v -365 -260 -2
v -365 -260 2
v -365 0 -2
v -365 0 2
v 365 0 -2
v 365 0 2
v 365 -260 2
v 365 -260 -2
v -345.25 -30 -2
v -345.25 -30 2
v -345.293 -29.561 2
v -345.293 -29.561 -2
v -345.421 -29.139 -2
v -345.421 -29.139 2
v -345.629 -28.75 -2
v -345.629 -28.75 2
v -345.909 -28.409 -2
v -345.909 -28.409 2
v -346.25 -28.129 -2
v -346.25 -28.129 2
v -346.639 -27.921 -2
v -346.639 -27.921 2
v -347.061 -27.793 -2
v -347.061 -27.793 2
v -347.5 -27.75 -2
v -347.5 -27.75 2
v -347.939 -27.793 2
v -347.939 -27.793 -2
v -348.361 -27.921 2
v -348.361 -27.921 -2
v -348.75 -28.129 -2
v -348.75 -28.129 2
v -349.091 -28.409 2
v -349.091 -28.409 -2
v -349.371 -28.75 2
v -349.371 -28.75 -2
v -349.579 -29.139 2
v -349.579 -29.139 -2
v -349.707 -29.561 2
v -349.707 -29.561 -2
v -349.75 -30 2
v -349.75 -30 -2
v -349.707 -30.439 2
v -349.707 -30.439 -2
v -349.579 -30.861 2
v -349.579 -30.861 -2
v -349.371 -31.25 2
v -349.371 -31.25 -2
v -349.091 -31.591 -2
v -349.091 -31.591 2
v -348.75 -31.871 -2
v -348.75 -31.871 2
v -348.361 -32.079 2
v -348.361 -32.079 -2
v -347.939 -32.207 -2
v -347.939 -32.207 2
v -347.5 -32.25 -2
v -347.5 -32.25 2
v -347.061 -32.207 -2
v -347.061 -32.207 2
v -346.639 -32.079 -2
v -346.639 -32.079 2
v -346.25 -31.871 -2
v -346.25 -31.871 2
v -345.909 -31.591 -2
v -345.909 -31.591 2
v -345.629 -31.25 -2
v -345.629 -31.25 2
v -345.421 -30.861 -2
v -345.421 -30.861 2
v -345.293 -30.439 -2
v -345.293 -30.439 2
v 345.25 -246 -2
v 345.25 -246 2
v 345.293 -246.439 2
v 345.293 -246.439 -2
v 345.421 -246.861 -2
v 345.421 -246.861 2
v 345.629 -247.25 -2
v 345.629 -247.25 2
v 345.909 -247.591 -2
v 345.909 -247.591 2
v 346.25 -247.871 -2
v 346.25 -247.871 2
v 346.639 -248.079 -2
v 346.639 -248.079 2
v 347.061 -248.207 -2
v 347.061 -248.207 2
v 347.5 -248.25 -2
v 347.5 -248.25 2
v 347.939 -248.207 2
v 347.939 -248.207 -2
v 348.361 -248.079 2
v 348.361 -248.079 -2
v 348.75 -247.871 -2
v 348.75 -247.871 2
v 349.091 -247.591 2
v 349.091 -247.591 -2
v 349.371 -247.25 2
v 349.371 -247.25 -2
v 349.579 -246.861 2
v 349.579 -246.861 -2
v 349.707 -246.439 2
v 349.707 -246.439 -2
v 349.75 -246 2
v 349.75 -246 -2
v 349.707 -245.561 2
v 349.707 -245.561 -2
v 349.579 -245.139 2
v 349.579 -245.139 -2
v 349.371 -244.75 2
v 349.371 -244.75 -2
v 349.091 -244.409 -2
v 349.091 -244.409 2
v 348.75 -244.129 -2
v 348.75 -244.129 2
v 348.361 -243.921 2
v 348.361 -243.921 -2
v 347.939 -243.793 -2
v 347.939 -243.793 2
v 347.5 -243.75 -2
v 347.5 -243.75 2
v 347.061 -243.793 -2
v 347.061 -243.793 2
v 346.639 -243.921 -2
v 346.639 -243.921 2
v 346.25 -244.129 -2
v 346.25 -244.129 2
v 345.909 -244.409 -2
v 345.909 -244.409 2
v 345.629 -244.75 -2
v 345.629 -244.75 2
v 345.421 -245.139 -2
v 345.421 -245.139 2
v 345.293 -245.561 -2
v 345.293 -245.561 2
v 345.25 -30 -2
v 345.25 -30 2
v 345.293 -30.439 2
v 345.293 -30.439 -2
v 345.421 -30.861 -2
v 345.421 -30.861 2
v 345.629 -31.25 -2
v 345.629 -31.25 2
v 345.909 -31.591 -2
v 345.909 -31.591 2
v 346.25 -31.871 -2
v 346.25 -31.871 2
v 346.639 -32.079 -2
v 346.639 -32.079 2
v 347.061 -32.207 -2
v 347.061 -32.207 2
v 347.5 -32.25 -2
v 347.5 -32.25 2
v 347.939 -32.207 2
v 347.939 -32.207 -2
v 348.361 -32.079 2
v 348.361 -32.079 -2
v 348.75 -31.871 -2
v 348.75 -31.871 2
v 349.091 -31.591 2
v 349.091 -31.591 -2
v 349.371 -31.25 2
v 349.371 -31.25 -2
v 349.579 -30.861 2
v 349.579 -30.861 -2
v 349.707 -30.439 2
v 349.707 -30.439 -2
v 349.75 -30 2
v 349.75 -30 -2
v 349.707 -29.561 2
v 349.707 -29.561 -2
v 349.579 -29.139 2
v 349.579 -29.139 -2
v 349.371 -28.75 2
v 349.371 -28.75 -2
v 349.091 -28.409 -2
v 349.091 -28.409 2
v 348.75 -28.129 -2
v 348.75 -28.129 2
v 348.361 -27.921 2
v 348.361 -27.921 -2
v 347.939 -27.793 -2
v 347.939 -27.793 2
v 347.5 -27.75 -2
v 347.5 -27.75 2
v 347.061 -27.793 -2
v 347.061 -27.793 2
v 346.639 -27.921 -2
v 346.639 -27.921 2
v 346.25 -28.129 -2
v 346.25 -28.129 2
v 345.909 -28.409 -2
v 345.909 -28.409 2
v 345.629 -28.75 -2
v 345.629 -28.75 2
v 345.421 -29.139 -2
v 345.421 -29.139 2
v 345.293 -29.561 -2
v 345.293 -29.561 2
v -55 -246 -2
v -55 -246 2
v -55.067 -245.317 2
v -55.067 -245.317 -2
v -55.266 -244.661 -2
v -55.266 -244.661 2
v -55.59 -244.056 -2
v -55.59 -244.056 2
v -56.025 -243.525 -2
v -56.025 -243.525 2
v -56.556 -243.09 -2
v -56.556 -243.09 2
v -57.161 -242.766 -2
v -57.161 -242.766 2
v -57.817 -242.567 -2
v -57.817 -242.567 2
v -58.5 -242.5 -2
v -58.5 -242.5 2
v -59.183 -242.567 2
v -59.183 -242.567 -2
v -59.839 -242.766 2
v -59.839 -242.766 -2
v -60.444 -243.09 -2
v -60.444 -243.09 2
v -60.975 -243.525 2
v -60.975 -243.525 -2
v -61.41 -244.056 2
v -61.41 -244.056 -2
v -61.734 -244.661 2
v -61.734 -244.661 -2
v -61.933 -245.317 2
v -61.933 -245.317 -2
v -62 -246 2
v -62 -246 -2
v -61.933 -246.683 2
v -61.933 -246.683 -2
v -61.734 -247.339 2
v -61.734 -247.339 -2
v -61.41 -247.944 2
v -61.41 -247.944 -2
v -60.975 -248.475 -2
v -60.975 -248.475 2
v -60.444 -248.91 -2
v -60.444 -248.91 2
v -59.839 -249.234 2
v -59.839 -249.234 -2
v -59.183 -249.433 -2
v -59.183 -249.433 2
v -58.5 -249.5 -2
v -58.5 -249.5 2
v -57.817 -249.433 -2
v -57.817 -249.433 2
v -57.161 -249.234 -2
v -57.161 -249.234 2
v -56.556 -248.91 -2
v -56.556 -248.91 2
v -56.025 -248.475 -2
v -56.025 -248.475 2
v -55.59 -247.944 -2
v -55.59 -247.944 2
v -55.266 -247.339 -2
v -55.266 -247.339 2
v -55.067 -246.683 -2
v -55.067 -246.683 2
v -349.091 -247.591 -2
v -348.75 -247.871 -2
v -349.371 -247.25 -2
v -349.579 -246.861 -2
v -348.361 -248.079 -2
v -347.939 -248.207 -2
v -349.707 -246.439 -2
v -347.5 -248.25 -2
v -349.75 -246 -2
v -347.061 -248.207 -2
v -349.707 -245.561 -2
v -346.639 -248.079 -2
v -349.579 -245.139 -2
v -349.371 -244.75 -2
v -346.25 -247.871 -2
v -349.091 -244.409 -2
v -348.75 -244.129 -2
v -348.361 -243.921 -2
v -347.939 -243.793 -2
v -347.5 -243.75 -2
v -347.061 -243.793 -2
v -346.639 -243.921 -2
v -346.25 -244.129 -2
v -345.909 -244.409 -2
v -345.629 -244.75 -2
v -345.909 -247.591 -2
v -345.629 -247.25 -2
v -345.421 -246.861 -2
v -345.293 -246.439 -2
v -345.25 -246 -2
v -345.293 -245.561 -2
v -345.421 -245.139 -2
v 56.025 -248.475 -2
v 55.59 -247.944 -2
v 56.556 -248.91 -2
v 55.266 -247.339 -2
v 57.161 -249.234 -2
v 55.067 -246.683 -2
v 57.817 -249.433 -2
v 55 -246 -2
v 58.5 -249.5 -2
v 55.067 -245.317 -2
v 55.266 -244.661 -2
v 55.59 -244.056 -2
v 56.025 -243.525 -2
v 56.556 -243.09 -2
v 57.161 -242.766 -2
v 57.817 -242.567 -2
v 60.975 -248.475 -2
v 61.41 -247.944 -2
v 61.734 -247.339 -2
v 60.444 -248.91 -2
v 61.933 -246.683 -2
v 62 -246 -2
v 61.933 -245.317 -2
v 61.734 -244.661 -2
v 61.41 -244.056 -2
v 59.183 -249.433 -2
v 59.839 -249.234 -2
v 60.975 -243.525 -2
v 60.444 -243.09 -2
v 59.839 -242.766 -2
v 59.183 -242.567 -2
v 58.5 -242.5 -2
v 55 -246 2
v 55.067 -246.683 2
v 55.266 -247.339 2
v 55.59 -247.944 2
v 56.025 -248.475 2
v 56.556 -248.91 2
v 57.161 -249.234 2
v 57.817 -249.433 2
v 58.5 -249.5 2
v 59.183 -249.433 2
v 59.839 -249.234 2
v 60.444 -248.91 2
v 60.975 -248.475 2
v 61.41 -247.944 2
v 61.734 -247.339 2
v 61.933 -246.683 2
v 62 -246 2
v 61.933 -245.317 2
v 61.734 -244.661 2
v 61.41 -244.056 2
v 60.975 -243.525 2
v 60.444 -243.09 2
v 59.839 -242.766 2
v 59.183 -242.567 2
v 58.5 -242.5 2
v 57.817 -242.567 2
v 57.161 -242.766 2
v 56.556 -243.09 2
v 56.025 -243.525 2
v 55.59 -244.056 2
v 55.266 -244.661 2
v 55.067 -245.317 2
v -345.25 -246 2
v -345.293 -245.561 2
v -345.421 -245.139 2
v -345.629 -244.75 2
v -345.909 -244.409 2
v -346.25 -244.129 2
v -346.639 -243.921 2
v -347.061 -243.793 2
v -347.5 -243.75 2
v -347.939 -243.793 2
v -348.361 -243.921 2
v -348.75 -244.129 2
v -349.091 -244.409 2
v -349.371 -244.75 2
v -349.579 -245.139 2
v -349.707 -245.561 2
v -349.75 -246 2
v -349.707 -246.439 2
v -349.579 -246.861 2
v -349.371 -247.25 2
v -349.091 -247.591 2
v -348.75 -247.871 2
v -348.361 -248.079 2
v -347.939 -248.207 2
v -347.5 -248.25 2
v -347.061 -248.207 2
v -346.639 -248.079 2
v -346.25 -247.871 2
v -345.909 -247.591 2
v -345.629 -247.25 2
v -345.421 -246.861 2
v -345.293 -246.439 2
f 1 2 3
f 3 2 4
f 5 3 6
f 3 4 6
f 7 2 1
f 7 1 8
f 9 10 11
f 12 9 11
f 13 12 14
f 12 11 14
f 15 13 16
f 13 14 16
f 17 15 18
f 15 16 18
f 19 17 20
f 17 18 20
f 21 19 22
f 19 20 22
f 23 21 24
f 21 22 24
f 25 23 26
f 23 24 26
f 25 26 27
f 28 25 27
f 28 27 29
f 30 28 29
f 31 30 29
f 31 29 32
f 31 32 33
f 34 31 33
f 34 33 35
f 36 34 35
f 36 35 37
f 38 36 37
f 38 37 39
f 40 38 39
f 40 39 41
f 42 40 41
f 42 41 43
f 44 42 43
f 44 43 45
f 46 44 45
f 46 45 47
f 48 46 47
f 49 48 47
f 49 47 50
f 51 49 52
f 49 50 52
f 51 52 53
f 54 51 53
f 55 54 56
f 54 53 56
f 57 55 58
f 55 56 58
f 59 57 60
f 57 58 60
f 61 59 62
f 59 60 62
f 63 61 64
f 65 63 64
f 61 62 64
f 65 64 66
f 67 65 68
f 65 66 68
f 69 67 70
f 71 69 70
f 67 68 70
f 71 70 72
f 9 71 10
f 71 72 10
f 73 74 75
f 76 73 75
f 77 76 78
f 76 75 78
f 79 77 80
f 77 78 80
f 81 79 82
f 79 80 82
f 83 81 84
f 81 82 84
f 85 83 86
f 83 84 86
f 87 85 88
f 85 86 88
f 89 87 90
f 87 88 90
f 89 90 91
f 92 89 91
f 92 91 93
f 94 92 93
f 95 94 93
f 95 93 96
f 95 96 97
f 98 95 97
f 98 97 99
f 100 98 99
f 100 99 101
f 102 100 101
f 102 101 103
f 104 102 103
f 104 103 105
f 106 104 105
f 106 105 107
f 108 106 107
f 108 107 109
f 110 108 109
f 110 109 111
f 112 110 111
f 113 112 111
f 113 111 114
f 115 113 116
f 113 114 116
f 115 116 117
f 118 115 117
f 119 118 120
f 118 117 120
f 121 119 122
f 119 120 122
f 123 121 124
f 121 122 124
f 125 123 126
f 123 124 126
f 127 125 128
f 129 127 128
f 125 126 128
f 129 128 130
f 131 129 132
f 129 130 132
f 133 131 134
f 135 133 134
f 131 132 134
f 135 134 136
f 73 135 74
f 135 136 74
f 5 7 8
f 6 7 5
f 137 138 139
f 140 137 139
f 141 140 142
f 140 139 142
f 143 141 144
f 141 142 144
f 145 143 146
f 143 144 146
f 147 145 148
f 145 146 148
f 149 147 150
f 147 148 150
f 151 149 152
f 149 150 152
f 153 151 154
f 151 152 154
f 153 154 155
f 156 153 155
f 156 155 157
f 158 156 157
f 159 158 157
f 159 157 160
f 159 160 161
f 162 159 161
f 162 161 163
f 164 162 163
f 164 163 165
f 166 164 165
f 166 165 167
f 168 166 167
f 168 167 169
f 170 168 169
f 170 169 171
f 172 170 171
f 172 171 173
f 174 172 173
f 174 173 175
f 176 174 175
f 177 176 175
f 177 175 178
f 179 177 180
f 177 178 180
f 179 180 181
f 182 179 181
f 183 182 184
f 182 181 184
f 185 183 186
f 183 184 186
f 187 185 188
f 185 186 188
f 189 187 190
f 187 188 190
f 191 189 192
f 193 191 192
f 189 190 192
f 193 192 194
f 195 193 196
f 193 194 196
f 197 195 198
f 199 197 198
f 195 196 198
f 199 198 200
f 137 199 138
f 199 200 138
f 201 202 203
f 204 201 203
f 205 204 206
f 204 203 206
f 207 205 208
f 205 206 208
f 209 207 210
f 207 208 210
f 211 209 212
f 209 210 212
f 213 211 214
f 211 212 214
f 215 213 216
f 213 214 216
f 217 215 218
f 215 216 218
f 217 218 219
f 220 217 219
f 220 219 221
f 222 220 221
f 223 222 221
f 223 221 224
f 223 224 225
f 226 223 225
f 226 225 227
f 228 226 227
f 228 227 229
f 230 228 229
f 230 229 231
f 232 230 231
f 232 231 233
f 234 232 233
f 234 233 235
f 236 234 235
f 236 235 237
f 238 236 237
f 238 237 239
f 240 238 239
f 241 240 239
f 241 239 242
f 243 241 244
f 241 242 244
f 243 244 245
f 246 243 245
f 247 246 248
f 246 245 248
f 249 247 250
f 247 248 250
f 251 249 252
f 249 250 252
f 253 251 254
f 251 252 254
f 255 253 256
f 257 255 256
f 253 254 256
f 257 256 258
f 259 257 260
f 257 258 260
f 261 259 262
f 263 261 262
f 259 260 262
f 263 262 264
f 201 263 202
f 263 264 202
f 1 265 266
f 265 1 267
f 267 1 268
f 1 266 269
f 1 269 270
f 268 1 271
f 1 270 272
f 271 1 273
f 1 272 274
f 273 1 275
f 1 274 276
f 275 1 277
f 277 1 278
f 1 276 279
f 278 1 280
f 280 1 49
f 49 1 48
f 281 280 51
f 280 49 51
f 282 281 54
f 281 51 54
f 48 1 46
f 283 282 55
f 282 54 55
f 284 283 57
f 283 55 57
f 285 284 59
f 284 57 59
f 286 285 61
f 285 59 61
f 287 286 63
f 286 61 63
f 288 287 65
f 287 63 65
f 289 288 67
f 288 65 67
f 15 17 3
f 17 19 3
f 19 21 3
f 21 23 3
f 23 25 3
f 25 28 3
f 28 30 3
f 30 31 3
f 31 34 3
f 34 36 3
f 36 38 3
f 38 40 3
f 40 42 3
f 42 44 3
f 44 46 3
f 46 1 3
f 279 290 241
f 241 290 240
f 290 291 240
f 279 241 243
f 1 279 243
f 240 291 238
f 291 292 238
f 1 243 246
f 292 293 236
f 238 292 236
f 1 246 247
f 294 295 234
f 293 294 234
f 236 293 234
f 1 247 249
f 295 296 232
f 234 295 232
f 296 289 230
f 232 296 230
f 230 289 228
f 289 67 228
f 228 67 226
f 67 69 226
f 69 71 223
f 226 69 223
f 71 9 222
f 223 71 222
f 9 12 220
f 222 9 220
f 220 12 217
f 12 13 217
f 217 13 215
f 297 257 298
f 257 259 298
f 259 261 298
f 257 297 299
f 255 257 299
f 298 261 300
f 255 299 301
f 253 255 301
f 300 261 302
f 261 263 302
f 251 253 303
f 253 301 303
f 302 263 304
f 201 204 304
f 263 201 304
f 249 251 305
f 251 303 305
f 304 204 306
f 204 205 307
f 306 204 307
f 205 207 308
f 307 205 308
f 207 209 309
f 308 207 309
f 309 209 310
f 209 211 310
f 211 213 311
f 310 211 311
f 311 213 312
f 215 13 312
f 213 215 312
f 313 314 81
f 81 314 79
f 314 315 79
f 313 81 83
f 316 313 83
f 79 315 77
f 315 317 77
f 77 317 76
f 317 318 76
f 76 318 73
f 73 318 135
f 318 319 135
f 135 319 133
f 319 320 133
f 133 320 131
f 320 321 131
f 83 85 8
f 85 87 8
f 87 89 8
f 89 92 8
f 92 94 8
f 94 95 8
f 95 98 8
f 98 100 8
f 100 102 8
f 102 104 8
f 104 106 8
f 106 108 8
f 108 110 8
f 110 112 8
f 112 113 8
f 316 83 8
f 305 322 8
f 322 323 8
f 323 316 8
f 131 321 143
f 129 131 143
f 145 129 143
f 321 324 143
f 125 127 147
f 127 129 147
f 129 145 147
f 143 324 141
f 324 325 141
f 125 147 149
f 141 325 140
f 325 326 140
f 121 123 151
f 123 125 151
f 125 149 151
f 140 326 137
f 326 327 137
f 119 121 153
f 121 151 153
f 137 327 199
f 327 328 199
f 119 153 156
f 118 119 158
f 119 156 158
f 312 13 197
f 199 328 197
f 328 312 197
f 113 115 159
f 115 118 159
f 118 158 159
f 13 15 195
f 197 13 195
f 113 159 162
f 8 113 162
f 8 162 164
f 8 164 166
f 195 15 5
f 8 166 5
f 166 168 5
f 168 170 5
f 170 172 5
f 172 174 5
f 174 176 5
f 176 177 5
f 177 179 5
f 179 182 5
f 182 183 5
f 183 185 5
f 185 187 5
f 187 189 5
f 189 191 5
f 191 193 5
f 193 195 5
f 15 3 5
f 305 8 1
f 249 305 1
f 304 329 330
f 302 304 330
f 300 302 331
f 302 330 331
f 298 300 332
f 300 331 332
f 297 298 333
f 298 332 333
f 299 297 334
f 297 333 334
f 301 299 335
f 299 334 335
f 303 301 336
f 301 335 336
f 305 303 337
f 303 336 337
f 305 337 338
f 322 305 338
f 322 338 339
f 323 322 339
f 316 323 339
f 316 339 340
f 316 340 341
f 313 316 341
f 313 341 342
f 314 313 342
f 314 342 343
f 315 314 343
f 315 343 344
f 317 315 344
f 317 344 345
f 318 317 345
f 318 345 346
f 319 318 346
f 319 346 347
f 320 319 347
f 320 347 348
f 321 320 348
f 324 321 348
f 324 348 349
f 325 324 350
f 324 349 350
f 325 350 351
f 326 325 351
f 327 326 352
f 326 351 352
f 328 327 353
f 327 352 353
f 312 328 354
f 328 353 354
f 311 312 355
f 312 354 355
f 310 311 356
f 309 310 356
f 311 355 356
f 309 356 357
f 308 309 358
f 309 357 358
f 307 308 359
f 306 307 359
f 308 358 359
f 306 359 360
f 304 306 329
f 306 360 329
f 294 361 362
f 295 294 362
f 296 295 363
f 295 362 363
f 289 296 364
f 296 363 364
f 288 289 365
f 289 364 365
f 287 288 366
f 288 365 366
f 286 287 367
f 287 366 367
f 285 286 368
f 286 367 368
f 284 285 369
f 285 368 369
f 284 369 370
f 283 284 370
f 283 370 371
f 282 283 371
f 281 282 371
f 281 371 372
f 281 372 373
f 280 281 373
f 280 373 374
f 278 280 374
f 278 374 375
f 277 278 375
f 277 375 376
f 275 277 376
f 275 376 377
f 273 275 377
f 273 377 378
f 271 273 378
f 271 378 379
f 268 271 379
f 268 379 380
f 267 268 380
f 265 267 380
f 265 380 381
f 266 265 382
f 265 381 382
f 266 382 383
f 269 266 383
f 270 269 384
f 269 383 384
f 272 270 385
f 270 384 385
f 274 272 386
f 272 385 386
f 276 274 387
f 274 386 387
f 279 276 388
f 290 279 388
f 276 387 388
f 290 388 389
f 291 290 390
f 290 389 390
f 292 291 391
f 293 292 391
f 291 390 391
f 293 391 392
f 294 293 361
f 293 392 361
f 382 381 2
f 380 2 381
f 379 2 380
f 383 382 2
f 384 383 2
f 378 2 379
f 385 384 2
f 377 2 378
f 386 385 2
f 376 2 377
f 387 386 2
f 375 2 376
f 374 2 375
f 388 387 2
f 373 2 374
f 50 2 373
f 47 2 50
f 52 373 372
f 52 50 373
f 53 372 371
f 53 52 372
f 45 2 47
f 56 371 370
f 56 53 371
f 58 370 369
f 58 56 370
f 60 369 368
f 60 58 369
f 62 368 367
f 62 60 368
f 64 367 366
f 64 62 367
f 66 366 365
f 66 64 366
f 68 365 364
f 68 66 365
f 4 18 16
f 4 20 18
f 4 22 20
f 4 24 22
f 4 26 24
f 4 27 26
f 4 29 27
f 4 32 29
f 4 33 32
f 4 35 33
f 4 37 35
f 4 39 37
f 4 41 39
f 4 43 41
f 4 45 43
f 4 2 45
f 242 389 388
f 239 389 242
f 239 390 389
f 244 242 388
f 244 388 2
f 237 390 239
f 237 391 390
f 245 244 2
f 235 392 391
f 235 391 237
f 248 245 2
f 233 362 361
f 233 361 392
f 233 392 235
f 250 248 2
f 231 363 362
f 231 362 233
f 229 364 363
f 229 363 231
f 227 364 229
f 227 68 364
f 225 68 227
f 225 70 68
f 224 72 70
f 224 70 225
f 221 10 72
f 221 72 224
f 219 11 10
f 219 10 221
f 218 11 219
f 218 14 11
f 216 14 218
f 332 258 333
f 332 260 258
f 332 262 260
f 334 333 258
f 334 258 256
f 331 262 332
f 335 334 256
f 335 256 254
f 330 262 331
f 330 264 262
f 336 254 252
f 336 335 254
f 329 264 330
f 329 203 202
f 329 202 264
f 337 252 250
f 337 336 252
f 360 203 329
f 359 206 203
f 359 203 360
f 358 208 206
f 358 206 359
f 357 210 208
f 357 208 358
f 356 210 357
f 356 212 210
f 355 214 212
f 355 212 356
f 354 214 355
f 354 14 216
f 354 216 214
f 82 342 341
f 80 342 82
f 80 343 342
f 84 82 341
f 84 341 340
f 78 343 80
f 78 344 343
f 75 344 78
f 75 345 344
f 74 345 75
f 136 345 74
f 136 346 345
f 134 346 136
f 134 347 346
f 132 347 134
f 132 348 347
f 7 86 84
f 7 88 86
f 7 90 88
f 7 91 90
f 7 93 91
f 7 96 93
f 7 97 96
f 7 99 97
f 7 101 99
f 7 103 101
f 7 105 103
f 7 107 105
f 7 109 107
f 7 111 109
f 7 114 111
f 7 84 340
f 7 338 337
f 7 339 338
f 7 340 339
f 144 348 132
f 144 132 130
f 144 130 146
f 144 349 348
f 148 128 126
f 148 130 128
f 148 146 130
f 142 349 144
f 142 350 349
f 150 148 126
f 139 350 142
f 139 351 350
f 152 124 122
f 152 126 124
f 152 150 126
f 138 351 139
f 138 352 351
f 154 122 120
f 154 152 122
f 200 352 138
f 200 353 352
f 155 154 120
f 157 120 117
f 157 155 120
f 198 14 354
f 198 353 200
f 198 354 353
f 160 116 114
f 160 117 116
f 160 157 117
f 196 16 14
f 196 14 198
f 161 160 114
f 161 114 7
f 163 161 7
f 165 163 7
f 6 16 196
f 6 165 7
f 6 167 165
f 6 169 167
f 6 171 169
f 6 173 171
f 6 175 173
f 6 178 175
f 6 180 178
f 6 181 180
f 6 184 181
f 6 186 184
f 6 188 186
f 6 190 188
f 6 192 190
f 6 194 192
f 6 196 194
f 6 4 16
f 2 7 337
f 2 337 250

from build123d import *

# Parameters (mm, degrees)
SKETCH1_W           = 730
SKETCH1_H           = 260
BOSS_EXTRUDE1_DEPTH = 2
SKETCH2_R           = 2.25
SKETCH2_R_2         = 3.5
CUT_EXTRUDE1_DEPTH  = 449.152875702


with BuildPart() as part:
    # Sketch1 → Boss-Extrude1 (new, symmetric)
    with BuildSketch(Plane.XY):
        with Locations((0, -130)):
            Rectangle(SKETCH1_W, SKETCH1_H)
    extrude(amount=BOSS_EXTRUDE1_DEPTH, both=True)

    # Sketch2 → Cut-Extrude1 (cut, through all)
    with BuildSketch(Plane.XY.offset(2)):
        with Locations((-347.5, -30)):
            Circle(SKETCH2_R)
        with Locations((-347.5, -246)):
            Circle(SKETCH2_R)
        with Locations((-58.5, -246)):
            Circle(SKETCH2_R_2)
        with Locations(Location((58.5, -246, 0), (0, 0, 180))):
            Circle(SKETCH2_R_2)
        with Locations(Location((347.5, -246, 0), (0, 0, 180))):
            Circle(SKETCH2_R)
        with Locations(Location((347.5, -30, 0), (0, 0, 180))):
            Circle(SKETCH2_R)
    extrude(amount=-CUT_EXTRUDE1_DEPTH, mode=Mode.SUBTRACT)


solid = part.part
